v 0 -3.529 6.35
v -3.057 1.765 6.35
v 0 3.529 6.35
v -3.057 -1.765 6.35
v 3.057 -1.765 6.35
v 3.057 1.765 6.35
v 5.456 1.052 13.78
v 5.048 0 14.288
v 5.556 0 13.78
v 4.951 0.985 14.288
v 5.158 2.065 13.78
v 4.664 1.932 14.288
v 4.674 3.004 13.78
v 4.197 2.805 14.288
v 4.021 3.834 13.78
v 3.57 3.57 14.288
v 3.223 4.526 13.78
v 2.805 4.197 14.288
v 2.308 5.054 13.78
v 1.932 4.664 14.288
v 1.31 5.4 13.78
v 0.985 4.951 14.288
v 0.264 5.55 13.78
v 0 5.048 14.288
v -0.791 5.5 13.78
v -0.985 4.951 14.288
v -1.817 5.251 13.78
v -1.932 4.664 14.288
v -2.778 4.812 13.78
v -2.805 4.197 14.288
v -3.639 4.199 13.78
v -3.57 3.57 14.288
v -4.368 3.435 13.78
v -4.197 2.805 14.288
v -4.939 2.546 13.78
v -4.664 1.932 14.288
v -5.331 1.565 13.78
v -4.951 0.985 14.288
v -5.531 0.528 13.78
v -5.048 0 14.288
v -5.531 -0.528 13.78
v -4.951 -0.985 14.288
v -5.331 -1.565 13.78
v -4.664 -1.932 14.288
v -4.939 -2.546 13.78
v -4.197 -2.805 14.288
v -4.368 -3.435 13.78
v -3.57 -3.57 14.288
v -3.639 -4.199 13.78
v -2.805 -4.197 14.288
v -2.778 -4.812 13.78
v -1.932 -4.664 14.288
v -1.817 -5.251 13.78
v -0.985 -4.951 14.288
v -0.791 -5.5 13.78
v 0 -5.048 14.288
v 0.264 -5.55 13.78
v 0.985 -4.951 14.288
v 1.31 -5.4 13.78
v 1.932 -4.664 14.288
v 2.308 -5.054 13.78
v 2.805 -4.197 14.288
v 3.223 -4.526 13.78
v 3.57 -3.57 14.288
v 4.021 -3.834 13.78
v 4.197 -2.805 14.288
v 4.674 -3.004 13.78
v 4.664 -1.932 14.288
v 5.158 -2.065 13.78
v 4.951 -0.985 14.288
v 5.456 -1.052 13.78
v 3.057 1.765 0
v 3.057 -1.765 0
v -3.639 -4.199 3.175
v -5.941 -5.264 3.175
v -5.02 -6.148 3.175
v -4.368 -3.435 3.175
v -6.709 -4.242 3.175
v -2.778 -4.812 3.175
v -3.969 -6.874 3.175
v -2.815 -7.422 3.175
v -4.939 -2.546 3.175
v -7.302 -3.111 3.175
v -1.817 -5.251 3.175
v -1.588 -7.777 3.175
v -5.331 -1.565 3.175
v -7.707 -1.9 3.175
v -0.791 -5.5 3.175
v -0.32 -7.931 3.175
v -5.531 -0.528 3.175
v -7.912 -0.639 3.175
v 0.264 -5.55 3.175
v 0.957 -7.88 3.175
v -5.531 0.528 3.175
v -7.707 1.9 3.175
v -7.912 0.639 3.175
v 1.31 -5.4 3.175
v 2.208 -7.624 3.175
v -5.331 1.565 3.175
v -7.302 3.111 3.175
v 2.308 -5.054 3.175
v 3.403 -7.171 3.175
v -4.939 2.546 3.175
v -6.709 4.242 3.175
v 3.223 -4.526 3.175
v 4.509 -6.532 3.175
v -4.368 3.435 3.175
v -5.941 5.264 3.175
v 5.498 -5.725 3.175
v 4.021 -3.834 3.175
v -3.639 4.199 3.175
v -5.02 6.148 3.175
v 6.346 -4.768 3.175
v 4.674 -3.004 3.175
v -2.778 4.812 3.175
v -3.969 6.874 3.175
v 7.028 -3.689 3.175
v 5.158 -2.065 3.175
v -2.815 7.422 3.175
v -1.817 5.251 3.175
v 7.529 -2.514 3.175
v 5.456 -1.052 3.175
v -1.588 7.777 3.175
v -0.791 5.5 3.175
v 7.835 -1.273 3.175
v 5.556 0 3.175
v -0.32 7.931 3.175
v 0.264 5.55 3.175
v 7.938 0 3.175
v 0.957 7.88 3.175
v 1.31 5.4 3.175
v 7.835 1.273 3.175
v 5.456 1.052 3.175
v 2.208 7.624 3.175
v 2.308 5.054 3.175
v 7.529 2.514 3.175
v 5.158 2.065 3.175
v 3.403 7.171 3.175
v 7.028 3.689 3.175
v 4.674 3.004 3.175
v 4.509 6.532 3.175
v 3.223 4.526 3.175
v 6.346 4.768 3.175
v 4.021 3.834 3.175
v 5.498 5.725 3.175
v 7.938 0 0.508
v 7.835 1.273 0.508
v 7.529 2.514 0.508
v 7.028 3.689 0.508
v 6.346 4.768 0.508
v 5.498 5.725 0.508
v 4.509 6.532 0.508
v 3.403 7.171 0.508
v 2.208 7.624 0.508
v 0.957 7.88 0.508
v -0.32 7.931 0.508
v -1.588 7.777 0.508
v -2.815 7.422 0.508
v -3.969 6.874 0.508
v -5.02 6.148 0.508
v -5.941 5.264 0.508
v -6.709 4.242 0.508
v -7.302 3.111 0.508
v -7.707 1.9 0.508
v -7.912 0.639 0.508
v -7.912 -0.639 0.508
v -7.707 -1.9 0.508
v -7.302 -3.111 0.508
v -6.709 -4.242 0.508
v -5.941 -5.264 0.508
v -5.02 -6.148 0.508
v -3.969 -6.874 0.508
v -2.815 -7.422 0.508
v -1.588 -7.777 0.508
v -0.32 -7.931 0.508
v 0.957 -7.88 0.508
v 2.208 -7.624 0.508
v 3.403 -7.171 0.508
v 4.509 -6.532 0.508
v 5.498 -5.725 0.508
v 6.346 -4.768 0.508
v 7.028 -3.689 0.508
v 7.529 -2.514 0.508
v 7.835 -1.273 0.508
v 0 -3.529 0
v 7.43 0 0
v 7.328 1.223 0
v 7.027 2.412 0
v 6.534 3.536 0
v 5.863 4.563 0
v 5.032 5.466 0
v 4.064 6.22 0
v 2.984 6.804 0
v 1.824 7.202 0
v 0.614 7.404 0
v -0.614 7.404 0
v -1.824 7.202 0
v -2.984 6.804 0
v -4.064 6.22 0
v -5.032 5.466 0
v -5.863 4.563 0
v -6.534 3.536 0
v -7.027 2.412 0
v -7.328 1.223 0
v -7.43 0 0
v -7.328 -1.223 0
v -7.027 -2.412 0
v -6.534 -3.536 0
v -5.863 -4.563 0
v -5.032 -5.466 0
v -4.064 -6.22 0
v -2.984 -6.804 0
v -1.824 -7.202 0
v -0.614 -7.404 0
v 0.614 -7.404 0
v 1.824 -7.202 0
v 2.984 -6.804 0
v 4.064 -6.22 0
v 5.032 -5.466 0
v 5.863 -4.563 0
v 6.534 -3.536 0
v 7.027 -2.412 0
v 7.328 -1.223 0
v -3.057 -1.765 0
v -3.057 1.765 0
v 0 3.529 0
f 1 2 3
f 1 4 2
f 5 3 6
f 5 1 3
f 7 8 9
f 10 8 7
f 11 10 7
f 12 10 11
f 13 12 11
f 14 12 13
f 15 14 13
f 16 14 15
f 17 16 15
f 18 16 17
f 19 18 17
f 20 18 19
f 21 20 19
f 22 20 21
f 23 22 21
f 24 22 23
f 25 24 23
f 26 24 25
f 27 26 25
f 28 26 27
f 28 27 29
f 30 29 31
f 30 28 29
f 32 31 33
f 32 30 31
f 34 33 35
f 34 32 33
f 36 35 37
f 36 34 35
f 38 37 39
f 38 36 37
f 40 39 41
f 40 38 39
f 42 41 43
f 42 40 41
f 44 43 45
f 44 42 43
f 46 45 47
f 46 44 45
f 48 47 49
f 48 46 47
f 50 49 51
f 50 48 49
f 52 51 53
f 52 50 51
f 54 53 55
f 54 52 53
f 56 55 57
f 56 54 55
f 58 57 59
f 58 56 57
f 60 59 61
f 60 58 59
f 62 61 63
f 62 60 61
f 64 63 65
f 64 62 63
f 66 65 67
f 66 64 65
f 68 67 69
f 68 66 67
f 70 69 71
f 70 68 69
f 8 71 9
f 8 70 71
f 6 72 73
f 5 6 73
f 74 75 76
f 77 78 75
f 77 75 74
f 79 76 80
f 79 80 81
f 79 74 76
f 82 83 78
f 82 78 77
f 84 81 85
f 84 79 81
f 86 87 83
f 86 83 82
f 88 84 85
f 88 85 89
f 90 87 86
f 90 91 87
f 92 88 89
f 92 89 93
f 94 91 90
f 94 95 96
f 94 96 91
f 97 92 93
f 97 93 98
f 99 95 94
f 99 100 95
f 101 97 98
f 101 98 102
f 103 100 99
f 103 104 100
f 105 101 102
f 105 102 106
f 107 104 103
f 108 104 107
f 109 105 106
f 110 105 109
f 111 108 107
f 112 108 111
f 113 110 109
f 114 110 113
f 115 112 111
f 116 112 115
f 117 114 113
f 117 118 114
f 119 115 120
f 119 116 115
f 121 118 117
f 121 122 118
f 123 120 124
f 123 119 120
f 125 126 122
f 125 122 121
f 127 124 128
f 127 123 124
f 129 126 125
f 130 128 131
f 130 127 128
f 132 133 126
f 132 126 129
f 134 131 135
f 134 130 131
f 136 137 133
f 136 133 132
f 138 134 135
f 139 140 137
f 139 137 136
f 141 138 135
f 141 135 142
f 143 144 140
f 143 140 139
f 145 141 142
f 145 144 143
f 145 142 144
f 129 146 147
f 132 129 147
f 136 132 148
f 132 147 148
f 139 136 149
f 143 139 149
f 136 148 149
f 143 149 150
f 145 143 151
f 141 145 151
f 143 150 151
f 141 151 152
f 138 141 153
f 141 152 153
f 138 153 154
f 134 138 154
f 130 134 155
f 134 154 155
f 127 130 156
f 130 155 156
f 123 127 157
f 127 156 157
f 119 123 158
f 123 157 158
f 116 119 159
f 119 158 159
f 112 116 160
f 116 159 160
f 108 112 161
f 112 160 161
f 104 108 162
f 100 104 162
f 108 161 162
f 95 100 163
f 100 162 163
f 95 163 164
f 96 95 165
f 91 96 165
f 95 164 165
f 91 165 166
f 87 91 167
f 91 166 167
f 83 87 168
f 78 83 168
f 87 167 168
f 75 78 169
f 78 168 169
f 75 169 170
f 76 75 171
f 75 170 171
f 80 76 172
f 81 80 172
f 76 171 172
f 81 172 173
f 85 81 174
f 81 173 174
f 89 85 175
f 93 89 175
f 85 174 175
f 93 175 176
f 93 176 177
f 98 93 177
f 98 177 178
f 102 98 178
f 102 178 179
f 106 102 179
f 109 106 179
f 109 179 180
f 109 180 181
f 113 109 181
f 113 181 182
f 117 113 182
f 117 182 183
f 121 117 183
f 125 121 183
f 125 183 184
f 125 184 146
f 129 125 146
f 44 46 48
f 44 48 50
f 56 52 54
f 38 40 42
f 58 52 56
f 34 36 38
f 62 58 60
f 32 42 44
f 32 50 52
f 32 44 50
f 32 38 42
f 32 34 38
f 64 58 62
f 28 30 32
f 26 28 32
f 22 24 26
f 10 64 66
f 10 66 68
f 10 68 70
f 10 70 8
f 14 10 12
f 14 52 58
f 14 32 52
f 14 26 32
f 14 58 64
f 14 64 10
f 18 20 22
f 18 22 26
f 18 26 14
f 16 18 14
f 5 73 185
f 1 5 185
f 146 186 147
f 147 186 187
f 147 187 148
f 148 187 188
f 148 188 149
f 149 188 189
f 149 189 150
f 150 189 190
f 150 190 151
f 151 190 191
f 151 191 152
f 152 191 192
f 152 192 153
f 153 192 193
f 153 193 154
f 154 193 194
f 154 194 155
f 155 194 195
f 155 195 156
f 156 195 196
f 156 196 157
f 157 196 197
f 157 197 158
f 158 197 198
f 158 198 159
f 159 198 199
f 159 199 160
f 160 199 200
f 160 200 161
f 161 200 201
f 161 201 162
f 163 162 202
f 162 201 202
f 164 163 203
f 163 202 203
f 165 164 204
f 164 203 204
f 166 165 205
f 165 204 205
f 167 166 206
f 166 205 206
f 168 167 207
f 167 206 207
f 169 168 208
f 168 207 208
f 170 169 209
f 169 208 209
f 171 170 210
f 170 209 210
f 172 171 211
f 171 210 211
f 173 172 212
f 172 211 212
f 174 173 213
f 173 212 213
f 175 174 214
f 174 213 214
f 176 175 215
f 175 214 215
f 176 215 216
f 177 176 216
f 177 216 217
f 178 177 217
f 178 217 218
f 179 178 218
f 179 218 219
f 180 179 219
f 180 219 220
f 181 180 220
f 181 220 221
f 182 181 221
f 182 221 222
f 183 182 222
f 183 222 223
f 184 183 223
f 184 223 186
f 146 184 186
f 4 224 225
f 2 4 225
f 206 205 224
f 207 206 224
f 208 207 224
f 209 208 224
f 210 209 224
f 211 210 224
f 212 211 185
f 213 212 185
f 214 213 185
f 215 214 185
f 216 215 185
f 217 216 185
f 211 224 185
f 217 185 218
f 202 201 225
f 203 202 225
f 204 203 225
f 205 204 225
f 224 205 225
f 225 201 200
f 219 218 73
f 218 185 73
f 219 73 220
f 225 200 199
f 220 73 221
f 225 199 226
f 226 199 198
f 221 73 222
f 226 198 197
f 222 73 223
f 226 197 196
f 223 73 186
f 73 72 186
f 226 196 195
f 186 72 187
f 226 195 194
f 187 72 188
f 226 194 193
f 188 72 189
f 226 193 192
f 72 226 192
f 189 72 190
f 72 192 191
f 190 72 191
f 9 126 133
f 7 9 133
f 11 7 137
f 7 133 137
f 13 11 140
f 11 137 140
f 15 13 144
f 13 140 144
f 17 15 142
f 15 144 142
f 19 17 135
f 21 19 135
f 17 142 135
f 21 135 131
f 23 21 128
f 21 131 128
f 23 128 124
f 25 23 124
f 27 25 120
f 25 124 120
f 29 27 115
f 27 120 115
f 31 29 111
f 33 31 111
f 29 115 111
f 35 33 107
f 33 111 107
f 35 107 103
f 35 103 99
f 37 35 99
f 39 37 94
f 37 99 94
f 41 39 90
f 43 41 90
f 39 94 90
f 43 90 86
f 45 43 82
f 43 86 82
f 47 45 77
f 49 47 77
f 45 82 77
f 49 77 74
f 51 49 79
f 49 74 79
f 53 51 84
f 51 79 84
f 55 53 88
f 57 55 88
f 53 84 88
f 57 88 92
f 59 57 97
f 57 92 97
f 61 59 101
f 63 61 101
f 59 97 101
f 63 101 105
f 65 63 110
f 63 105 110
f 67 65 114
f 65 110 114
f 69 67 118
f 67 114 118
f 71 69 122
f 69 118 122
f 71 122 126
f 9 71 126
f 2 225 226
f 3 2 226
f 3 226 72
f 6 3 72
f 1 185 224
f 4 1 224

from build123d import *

# Parameters (mm, degrees)
F0_R     = 7.9375
F1_DEPTH = 3.175
F2_R     = 5.55625
F3_DEPTH = 11.1125
F5_DEPTH = 6.35
F6_SIZE  = 0.508


with BuildPart() as f1:
    # F0 (on Top) → F1 (new body)
    with BuildSketch(Plane.XY):
        Circle(F0_R)
    extrude(amount=F1_DEPTH)

    # F2 (on face) → F3 (join)
    with BuildSketch(Plane.XY.offset(3.175)):
        Circle(F2_R)
    extrude(amount=F3_DEPTH)

    # F4 (on face) → F5 (cut)
    with BuildSketch(Plane(origin=(0, 0, 0), x_dir=(1, 0, 0), z_dir=(0, 0, -1))):
        Polygon((-3.056609, -1.764734), (0, -3.529468), (3.056609, -1.764734), (3.056609, 1.764734), (0, 3.529468), (-3.056609, 1.764734), align=None)
    extrude(amount=-F5_DEPTH, mode=Mode.SUBTRACT)

    # F6
    f6_edges = [f1.edges().sort_by_distance(p)[0] for p in [
        (-5.55625, 0, 14.2875),
        (-7.9375, 0, 0),
    ]]
    chamfer(f6_edges, length=F6_SIZE)


solid = f1.part
